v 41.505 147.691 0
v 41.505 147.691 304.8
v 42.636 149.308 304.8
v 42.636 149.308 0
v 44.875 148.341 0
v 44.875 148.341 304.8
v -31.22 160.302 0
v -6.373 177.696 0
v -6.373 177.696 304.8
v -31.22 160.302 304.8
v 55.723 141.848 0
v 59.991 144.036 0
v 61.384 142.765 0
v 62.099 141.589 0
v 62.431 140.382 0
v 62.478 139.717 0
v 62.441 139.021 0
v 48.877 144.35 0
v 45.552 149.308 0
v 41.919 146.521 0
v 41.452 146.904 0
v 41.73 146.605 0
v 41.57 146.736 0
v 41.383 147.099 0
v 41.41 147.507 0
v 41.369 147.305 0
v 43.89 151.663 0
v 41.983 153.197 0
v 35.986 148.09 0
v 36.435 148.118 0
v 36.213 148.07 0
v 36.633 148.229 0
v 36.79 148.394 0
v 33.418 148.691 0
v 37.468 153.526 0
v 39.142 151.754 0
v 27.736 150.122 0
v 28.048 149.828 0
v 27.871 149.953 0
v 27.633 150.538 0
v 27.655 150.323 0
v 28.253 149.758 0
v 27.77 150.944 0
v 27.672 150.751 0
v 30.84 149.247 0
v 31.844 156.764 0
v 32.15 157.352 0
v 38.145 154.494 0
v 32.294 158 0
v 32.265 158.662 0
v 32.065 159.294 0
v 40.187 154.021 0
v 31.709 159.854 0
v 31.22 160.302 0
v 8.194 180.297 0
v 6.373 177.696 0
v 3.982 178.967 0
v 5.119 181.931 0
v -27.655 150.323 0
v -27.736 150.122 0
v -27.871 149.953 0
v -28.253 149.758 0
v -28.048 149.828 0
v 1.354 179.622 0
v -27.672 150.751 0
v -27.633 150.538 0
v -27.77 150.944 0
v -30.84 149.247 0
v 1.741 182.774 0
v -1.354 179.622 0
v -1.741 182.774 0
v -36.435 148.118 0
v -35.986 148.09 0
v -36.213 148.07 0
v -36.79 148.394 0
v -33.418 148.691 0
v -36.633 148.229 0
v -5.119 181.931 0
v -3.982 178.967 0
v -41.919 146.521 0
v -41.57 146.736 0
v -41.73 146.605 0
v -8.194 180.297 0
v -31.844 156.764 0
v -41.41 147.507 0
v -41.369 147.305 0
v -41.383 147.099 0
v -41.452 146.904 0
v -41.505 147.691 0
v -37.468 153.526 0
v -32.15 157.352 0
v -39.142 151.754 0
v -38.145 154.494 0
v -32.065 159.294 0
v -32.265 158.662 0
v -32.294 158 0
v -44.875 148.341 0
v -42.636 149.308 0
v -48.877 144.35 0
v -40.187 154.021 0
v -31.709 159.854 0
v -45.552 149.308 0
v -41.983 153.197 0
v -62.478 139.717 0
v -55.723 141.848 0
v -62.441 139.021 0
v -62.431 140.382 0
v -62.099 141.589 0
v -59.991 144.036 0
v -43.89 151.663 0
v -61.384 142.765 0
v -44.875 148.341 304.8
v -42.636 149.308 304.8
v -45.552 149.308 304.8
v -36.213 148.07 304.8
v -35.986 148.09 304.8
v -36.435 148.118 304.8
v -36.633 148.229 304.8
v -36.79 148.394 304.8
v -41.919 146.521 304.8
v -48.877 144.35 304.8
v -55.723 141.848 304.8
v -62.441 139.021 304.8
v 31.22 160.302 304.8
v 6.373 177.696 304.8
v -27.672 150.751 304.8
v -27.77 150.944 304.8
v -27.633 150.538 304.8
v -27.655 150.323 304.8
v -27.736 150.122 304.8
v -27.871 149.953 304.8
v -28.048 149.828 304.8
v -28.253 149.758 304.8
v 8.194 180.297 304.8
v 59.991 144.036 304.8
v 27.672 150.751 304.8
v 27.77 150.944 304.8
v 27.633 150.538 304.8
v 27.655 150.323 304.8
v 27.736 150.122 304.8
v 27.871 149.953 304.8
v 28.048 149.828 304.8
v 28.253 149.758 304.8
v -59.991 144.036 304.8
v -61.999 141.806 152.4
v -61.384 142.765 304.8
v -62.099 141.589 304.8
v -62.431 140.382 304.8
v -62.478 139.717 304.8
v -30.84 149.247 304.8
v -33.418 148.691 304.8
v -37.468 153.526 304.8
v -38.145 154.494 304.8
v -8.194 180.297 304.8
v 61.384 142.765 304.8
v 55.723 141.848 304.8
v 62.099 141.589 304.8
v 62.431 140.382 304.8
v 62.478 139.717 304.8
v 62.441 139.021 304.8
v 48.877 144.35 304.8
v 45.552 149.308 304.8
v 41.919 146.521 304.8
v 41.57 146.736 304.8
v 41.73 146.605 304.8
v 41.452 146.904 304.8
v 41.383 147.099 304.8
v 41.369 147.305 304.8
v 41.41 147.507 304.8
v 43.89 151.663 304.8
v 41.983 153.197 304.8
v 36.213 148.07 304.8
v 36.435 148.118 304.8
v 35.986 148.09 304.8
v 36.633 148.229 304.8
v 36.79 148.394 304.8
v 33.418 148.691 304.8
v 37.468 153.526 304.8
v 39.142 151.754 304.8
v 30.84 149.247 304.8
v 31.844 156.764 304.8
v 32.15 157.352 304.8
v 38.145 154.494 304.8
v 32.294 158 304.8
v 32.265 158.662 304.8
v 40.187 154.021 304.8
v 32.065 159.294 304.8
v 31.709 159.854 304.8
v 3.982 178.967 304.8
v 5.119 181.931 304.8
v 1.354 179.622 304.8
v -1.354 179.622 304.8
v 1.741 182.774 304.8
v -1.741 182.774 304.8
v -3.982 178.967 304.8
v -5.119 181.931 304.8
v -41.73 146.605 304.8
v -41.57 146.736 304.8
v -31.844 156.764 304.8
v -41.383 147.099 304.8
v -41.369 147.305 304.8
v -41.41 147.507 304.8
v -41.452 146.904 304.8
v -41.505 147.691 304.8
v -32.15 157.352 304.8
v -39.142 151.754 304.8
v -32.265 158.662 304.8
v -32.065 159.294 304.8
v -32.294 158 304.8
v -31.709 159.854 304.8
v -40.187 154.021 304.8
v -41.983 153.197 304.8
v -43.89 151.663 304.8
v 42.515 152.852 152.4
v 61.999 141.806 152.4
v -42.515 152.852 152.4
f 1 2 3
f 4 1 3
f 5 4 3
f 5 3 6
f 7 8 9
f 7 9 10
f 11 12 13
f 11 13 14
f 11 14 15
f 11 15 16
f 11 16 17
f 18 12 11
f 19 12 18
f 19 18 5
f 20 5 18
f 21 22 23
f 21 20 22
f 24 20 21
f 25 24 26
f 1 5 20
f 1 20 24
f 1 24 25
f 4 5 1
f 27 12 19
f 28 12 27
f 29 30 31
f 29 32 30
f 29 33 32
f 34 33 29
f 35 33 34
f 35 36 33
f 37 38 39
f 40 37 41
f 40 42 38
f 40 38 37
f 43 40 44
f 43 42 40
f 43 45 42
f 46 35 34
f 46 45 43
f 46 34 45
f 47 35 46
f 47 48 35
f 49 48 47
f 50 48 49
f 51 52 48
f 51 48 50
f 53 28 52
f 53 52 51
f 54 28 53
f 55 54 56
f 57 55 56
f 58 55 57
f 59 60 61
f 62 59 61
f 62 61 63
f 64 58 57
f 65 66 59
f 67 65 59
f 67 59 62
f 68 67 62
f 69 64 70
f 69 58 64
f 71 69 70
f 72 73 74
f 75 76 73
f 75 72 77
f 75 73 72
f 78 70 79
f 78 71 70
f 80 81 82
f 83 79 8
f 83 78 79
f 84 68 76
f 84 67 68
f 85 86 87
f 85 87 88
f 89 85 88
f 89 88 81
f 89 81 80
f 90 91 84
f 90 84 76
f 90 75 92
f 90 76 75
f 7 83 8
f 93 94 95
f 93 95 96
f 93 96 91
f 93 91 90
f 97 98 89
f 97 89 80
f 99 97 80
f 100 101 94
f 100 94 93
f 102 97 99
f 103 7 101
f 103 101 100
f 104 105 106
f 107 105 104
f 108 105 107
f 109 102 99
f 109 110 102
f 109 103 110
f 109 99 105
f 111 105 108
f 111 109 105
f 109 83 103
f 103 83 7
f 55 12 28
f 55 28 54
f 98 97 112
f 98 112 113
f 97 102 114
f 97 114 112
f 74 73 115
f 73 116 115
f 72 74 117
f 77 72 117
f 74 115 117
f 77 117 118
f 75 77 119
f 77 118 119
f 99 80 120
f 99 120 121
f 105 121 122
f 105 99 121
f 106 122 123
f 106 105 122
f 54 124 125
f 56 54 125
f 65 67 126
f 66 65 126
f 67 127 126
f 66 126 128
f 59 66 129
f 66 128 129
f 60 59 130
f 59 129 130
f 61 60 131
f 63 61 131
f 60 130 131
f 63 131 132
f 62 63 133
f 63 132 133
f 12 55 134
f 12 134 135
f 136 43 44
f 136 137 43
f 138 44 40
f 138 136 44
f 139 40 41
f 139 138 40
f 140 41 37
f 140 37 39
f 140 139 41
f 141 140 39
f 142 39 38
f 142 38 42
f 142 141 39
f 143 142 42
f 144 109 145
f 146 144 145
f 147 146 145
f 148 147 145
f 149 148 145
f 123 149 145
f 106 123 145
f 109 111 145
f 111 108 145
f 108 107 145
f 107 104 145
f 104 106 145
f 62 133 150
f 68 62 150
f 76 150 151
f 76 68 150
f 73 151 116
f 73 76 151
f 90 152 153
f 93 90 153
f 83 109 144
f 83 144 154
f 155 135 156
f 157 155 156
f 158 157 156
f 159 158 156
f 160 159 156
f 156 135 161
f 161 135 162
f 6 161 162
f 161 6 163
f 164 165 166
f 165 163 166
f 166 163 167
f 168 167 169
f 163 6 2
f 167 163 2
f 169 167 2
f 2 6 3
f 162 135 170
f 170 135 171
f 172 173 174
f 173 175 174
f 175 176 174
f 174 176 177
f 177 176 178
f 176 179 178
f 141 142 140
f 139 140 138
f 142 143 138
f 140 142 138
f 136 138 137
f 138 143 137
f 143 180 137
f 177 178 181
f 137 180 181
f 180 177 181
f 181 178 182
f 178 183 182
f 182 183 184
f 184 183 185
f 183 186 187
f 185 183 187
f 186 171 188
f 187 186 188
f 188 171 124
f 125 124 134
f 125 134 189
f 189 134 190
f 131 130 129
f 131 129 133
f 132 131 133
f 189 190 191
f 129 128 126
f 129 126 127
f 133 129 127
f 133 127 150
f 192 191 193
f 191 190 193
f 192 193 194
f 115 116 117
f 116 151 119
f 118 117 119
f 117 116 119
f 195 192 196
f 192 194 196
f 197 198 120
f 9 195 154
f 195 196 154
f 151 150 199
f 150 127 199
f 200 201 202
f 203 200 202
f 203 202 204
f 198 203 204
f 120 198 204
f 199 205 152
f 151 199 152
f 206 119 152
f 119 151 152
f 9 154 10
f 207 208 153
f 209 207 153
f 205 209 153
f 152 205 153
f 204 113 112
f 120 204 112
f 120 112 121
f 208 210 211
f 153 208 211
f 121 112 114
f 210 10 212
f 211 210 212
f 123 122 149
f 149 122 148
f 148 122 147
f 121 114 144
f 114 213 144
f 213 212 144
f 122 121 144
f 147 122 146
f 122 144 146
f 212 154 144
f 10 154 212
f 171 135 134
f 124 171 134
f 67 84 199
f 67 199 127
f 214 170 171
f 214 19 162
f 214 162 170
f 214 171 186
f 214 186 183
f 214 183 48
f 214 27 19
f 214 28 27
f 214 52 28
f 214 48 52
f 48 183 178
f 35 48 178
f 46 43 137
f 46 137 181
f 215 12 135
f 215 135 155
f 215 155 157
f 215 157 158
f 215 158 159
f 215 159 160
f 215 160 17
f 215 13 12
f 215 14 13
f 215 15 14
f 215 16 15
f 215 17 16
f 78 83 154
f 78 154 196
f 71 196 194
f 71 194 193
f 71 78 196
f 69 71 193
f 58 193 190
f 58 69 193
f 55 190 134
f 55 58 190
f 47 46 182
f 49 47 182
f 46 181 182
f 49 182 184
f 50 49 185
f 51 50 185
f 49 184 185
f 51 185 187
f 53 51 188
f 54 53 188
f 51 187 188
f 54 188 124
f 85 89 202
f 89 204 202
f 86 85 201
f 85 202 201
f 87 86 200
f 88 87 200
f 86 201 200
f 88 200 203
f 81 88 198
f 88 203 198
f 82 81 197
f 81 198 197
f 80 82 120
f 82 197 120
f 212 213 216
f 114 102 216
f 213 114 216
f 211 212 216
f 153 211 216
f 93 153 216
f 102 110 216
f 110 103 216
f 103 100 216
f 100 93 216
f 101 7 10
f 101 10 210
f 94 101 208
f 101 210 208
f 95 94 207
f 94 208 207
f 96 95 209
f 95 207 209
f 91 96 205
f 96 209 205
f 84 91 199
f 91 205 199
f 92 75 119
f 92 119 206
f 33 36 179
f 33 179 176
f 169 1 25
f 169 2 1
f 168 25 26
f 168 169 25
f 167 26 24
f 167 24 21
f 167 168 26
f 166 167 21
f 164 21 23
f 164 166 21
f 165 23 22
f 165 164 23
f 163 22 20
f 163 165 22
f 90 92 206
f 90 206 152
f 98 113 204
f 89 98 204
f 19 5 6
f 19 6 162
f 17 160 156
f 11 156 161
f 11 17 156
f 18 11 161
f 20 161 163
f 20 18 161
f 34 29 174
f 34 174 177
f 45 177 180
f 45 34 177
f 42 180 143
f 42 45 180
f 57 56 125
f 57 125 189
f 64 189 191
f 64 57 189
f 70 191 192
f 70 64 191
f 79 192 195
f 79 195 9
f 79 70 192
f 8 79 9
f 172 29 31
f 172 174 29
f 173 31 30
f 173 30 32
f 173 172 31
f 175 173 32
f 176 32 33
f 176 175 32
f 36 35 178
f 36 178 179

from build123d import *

# Parameters (mm, degrees)
BOSS_EXTRUDE1_DEPTH = 304.8
FILLET2_R           = 2.54
FILLET7_R           = 0.762


with BuildPart() as part:
    # Sketch1 → Boss-Extrude1 (new body)
    with BuildSketch(Plane.XY):
        with BuildLine():
            Line((-59.991213716, 144.035687339), (-8.193810242, 180.296949153))
            ThreePointArc((-8.193810242, 180.296949153), (0, 182.88), (8.193810242, 180.296949153))
            Line((8.193810242, 180.296949153), (59.991213716, 144.035687339))
            add(Edge.make_bspline(
                [(59.991213716, 144.035687339), (62.78248672, 142.0840471), (62.441206007, 139.021062406)],
                knots=[0, 0, 0, 1, 1, 1], degree=2))
            ThreePointArc((62.441206007, 139.021062406), (51.81191727, 143.32231239), (40.889317917, 146.812205488))
            Line((40.889317917, 146.812205488), (42.636417316, 149.30784982))
            Line((42.636417316, 149.30784982), (44.875008407, 148.34072044))
            Line((44.875008407, 148.34072044), (45.552343011, 149.308259131))
            add(Edge.make_bspline(
                [(45.552343011, 149.308259131), (43.180649259, 153.803743217), (38.144971739, 154.493859392)],
                knots=[0, 0, 0, 1, 1, 1], degree=2))
            Line((38.144971739, 154.493859392), (37.467637136, 153.526320702))
            Line((37.467637136, 153.526320702), (39.142437036, 151.753843735))
            Line((39.142437036, 151.753843735), (36.49122578, 147.966720721))
            ThreePointArc((36.49122578, 147.966720721), (31.806362047, 149.044004688), (27.089852549, 149.972997199))
            Line((27.089852549, 149.972997199), (33.300728714, 158.844923948))
            Line((33.300728714, 158.844923948), (6.372963522, 177.695960452))
            ThreePointArc((6.372963522, 177.695960452), (0, 179.705), (-6.372963522, 177.695960452))
            Line((-6.372963522, 177.695960452), (-33.300728714, 158.844923948))
            Line((-33.300728714, 158.844923948), (-27.089852549, 149.972997199))
            ThreePointArc((-27.089852549, 149.972997199), (-31.806362047, 149.044004688), (-36.49122578, 147.966720721))
            Line((-36.49122578, 147.966720721), (-39.142437036, 151.753843735))
            Line((-39.142437036, 151.753843735), (-37.467637136, 153.526320702))
            Line((-37.467637136, 153.526320702), (-38.144971739, 154.493859392))
            add(Edge.make_bspline(
                [(-45.552343011, 149.308259131), (-43.180649259, 153.803743217), (-38.144971739, 154.493859392)],
                knots=[0, 0, 0, 1, 1, 1], degree=2))
            Line((-45.552343011, 149.308259131), (-44.875008407, 148.34072044))
            Line((-44.875008407, 148.34072044), (-42.636417316, 149.30784982))
            Line((-42.636417316, 149.30784982), (-40.889317917, 146.812205488))
            ThreePointArc((-40.889317917, 146.812205488), (-51.81191727, 143.32231239), (-62.441206007, 139.021062406))
            add(Edge.make_bspline(
                [(-59.991213716, 144.035687339), (-62.78248672, 142.0840471), (-62.441206007, 139.021062406)],
                knots=[0, 0, 0, 1, 1, 1], degree=2))
        make_face()
    extrude(amount=BOSS_EXTRUDE1_DEPTH)

    # Fillet2
    fillet2_edges = [part.edges().sort_by_distance(p)[0] for p in [
        (33.300728714, 158.844923948, 152.4),
        (-33.300728714, 158.844923948, 152.4),
    ]]
    fillet(fillet2_edges, radius=FILLET2_R)

    # Fillet7
    fillet7_edges = [part.edges().sort_by_distance(p)[0] for p in [
        (40.889317917, 146.812205488, 152.4),
        (36.49122578, 147.966720721, 152.4),
        (27.089852549, 149.972997199, 152.4),
        (-27.089852549, 149.972997199, 152.4),
        (-36.49122578, 147.966720721, 152.4),
        (-40.889317917, 146.812205488, 152.4),
    ]]
    fillet(fillet7_edges, radius=FILLET7_R)


solid = part.part
